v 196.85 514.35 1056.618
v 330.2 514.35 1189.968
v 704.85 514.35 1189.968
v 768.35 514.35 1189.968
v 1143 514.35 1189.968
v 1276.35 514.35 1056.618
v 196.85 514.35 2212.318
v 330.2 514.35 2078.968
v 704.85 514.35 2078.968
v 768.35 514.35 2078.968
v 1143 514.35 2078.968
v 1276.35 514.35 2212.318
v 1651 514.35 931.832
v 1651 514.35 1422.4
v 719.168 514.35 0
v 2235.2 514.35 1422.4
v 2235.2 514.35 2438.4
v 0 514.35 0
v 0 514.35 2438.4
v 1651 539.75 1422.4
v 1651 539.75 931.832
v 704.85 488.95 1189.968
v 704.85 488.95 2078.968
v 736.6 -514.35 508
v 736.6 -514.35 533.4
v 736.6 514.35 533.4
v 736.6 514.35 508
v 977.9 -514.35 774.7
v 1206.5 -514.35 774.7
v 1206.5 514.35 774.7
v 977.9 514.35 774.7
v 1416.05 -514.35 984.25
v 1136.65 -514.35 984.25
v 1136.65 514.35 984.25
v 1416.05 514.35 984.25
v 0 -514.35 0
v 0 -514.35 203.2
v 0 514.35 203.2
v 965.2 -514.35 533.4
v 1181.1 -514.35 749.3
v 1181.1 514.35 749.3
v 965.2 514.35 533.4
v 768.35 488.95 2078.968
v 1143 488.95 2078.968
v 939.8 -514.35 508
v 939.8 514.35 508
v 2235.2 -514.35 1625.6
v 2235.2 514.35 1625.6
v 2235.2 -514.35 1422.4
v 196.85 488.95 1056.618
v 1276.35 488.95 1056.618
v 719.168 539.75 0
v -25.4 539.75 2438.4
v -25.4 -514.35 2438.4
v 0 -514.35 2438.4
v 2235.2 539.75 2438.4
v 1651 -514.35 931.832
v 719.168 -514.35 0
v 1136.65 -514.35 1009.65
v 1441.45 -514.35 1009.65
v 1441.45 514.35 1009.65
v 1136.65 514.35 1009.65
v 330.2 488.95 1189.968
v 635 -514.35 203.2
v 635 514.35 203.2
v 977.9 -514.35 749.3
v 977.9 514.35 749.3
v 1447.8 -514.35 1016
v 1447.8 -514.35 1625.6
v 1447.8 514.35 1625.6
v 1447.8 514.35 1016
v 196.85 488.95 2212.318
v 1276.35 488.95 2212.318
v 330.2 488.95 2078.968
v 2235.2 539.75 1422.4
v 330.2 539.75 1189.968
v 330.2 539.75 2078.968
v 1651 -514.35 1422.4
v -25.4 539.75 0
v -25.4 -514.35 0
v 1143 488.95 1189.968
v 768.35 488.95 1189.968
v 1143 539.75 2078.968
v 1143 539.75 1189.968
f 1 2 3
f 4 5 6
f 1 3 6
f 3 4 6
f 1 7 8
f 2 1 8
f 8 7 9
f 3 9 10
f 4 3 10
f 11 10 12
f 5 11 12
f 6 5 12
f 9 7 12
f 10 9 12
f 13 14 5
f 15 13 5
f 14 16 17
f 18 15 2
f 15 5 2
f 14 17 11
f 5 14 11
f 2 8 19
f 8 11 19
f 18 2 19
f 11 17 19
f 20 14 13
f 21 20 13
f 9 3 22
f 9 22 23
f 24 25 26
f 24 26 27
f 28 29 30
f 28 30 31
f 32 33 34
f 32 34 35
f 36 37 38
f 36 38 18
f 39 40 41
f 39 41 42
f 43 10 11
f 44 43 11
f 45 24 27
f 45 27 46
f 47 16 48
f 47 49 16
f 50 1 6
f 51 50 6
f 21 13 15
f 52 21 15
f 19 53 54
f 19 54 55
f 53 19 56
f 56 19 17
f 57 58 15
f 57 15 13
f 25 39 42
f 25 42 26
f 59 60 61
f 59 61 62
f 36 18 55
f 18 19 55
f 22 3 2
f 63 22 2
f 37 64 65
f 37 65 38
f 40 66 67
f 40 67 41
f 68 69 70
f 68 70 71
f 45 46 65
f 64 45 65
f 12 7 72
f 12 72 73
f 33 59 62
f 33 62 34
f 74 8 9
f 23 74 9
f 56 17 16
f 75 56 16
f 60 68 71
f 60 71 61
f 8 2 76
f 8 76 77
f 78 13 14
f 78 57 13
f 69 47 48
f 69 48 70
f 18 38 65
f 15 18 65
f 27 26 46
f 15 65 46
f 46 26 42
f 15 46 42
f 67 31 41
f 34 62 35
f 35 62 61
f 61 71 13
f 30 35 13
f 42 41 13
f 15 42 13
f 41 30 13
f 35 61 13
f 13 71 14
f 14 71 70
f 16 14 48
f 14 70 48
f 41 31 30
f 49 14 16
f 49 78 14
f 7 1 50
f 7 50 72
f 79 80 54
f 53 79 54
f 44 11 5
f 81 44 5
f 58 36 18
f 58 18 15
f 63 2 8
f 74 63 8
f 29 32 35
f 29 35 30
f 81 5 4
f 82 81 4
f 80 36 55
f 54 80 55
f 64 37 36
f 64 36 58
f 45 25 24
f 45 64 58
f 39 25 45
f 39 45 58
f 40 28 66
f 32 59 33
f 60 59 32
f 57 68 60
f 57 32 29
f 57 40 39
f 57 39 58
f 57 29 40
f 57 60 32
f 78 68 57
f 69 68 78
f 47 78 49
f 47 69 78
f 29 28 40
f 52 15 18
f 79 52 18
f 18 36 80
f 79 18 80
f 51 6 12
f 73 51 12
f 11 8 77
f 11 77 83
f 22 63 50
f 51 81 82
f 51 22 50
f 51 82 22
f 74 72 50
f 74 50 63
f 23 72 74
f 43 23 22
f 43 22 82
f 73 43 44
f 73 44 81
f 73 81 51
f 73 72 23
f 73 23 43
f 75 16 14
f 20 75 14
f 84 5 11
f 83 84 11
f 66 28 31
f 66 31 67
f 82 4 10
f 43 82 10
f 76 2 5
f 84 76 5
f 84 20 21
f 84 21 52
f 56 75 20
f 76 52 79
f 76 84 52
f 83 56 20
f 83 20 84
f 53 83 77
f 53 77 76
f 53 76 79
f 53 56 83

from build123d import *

# Parameters (mm, degrees)
F1_DEPTH = 514.35
F2_W     = 1028.7
F2_H     = 203.2
F2_H_2   = 2235.2
F3_DEPTH = 25.4
F5_DEPTH = 25.4
F6_W     = 812.8
F6_H     = 889
F7_DEPTH = 25.401
F8_W     = 1079.5
F8_H     = 1155.7
F8_W_2   = 63.5
F8_H_2   = 889
F9_DEPTH = 25.4


with BuildPart() as f1:
    # F0 (on Front) → F1 (new body, symmetric)
    with BuildSketch(Plane.XZ):
        Polygon((2235.2, 1422.4), (2235.2, 1625.6), (1447.8, 1625.6), (1447.8, 1016), (1441.45, 1009.65), (1136.65, 1009.65), (1136.65, 984.25), (1416.05, 984.25), (1206.5, 774.7), (977.9, 774.7), (977.9, 749.3), (1181.1, 749.3), (965.2, 533.4), (736.6, 533.4), (736.6, 508), (939.8, 508), (635, 203.2), (0, 203.2), (0, 0), (719.1681958742, 0), (1651, 931.8318041258), (1651, 1422.4), align=None)
    extrude(amount=F1_DEPTH, both=True)


with BuildPart() as f3:
    # F2 (on face) → F3 (new body)
    with BuildSketch(Plane(origin=(0, 0, 0), x_dir=(0, -1, 0), z_dir=(-1, 0, 0))):
        with Locations((0, 101.6)):
            Rectangle(F2_W, F2_H)
        with Locations((0, 1320.8)):
            Rectangle(F2_W, F2_H_2)
    extrude(amount=F3_DEPTH)

    # F4 (on face) → F5 (join)
    with BuildSketch(Plane(origin=(0, 514.35, 0), x_dir=(-1, 0, 0), z_dir=(0, 1, 0))):
        Polygon((-2235.2, 2438.4), (-2235.2, 1625.6), (-1447.8, 1625.6), (-1447.8, 1016), (-1441.45, 1009.65), (-1136.65, 1009.65), (-1136.65, 984.25), (-1416.05, 984.25), (-1206.5, 774.7), (-977.9, 774.7), (-977.9, 749.3), (-1181.1, 749.3), (-965.2, 533.4), (-736.6, 533.4), (-736.6, 508), (-939.8, 508), (-635, 203.2), (0, 203.2), (0, 0), (25.4, 0), (25.4, 2438.4), align=None)
        Polygon((-2235.2, 1625.6), (-2235.2, 1422.4), (-1651, 1422.4), (-1651, 931.8318041258), (-719.1681958742, 0), (0, 0), (0, 203.2), (-635, 203.2), (-939.8, 508), (-736.6, 508), (-736.6, 533.4), (-965.2, 533.4), (-1181.1, 749.3), (-977.9, 749.3), (-977.9, 774.7), (-1206.5, 774.7), (-1416.05, 984.25), (-1136.65, 984.25), (-1136.65, 1009.65), (-1441.45, 1009.65), (-1447.8, 1016), (-1447.8, 1625.6), align=None)
    extrude(amount=F5_DEPTH)

    # F6 (on face) → F7 (cut, through all)
    with BuildSketch(Plane.XZ.offset(-514.35)):
        with Locations((736.6, 1634.46784906)):
            Rectangle(F6_W, F6_H)
    extrude(amount=-F7_DEPTH, mode=Mode.SUBTRACT)


with BuildPart() as f9:
    # F8 (on face) → F9 (new body)
    with BuildSketch(Plane.XZ.offset(-514.35)):
        with Locations((736.6, 1634.46784906)):
            Rectangle(F8_W, F8_H)
        Polygon((704.85, 1189.96784906), (330.2, 1189.96784906), (330.2, 2078.96784906), (704.85, 2078.96784906), (768.35, 2078.96784906), (1143, 2078.96784906), (1143, 1189.96784906), (768.35, 1189.96784906), align=None, mode=Mode.SUBTRACT)
        with Locations((736.6, 1634.46784906)):
            Rectangle(F8_W_2, F8_H_2)
    extrude(amount=F9_DEPTH)


solid = Compound([f1.part, f3.part, f9.part])
